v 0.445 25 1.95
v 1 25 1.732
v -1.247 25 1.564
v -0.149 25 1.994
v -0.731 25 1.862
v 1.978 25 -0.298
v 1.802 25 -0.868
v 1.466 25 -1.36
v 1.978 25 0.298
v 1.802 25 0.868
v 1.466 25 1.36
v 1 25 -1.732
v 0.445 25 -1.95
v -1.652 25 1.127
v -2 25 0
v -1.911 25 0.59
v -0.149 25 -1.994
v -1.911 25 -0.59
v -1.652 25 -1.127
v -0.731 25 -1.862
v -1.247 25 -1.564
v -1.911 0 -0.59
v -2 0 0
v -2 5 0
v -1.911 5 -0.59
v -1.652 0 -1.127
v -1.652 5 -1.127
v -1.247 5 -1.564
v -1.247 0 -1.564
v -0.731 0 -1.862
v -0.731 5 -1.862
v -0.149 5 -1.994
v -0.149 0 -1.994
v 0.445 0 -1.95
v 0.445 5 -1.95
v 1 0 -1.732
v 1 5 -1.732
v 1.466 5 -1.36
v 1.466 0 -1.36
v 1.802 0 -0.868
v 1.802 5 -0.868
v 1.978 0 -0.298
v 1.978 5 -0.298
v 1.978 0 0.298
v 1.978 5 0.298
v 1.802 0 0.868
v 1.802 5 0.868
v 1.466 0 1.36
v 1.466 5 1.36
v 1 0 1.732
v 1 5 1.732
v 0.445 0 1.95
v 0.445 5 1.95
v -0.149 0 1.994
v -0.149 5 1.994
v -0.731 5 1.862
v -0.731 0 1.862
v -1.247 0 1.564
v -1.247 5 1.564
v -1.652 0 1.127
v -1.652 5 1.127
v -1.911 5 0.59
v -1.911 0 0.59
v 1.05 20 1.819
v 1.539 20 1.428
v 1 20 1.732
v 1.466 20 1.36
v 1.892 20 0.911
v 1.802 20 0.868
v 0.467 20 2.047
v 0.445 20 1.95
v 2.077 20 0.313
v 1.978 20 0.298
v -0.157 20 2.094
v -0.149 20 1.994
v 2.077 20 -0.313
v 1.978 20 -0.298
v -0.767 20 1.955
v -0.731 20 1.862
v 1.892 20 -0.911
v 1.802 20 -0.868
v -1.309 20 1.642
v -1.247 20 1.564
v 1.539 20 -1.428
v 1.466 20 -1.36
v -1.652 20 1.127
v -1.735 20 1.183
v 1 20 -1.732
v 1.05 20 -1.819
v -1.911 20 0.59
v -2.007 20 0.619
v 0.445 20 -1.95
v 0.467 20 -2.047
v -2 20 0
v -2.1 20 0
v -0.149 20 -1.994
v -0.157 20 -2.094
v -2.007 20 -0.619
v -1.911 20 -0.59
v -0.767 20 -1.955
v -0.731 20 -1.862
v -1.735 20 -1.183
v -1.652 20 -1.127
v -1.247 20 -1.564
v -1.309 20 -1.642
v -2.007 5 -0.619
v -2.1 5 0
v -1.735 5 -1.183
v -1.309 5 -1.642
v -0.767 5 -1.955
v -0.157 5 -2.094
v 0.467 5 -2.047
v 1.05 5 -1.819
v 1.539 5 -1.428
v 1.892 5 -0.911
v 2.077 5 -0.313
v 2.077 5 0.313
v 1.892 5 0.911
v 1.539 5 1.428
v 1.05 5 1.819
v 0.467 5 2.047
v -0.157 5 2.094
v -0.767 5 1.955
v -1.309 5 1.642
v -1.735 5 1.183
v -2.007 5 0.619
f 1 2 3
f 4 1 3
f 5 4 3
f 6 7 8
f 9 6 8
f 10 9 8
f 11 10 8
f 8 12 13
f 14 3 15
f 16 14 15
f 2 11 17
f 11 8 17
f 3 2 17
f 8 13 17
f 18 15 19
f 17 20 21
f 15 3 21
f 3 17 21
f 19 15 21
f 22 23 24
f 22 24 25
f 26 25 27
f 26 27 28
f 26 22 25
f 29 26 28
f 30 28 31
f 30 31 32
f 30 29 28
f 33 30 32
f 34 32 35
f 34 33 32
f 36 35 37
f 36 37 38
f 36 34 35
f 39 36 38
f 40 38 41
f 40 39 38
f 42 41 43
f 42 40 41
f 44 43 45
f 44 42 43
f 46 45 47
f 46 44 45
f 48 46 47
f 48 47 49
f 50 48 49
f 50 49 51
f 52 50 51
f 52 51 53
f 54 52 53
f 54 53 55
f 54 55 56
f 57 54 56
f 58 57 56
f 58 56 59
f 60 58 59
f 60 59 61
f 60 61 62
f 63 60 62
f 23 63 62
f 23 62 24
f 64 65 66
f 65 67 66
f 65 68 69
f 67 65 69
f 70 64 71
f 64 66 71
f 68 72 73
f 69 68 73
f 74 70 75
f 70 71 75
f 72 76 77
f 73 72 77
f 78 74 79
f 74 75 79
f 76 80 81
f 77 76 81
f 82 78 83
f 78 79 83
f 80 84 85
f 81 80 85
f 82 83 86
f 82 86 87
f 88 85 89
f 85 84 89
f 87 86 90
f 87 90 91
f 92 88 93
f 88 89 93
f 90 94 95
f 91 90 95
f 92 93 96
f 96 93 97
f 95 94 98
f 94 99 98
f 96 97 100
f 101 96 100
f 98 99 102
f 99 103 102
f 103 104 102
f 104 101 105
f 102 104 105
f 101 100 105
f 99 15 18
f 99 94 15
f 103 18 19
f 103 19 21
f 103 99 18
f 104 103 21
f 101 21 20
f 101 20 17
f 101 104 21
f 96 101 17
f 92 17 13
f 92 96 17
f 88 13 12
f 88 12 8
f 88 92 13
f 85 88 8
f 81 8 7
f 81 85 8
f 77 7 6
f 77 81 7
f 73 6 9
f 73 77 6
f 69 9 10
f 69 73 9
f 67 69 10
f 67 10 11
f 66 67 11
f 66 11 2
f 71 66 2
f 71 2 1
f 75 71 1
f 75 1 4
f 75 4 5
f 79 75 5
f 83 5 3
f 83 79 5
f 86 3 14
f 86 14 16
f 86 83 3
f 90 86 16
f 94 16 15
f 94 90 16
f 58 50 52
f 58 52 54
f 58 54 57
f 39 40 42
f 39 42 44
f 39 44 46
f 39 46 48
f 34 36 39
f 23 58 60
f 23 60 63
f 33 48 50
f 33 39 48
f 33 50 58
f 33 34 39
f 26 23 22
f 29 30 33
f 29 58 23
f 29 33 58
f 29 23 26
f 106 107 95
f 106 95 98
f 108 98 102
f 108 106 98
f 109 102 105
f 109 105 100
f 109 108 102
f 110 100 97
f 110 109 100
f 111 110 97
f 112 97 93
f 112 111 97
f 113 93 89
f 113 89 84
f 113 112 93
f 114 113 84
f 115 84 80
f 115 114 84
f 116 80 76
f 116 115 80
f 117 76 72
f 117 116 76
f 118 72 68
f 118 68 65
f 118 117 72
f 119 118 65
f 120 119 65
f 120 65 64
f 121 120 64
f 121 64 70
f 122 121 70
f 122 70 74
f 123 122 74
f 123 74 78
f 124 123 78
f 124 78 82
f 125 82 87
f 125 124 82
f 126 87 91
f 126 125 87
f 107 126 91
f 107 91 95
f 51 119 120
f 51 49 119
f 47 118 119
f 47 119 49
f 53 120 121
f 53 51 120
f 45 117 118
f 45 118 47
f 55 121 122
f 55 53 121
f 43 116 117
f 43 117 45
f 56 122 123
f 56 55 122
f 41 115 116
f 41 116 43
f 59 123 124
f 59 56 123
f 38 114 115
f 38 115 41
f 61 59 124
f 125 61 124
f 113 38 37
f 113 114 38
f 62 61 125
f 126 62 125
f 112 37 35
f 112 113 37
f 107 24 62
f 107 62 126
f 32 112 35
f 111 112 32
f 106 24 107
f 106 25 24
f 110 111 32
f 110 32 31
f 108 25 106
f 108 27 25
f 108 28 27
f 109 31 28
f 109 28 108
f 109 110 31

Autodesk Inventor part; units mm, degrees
ref_plane "YZ Plane" through (0, 0, 0) normal (1, 0, 0) x (0, 1, 0)
ref_plane "XZ Plane" through (0, 0, 0) normal (0, 1, 0) x (-1, 0, 0)
ref_plane "XY Plane" through (0, 0, 0) normal (0, 0, 1) x (1, 0, 0)
sketch "Sketch1" plane through (0, 0, 0) normal (0, 0, 1) x (1, 0, 0)
  line L0 (0, 0) -> (-2, 0)
  line L1 (-2, 25) -> (0, 25)
  line L2 (0, 25) -> (0, 0)
  line L3 (-2, 25) -> (-2, 20)
  line L4 (-2, 20) -> (-2.1, 20)
  line L5 (-2.1, 20) -> (-2.1, 5)
  line L6 (-2.1, 5) -> (-2, 5)
  line L7 (-2, 5) -> (-2, 0)
  dimension "d0" = 2
  dimension "d7" = 2.1
  dimension "d12" = 5
  dimension "d13" = 5
  dimension "d14" = 25
revolve "Revolution1" add sketch "Sketch1" angle 360 about axis through (0, 25, 0) along (0, -1, 0)
thread "Thread2" size "M4x0.7" class "6g" standard "ANSI Metric M Profile" full length
properties part number "FrameSupport-Link" material "Copper"
